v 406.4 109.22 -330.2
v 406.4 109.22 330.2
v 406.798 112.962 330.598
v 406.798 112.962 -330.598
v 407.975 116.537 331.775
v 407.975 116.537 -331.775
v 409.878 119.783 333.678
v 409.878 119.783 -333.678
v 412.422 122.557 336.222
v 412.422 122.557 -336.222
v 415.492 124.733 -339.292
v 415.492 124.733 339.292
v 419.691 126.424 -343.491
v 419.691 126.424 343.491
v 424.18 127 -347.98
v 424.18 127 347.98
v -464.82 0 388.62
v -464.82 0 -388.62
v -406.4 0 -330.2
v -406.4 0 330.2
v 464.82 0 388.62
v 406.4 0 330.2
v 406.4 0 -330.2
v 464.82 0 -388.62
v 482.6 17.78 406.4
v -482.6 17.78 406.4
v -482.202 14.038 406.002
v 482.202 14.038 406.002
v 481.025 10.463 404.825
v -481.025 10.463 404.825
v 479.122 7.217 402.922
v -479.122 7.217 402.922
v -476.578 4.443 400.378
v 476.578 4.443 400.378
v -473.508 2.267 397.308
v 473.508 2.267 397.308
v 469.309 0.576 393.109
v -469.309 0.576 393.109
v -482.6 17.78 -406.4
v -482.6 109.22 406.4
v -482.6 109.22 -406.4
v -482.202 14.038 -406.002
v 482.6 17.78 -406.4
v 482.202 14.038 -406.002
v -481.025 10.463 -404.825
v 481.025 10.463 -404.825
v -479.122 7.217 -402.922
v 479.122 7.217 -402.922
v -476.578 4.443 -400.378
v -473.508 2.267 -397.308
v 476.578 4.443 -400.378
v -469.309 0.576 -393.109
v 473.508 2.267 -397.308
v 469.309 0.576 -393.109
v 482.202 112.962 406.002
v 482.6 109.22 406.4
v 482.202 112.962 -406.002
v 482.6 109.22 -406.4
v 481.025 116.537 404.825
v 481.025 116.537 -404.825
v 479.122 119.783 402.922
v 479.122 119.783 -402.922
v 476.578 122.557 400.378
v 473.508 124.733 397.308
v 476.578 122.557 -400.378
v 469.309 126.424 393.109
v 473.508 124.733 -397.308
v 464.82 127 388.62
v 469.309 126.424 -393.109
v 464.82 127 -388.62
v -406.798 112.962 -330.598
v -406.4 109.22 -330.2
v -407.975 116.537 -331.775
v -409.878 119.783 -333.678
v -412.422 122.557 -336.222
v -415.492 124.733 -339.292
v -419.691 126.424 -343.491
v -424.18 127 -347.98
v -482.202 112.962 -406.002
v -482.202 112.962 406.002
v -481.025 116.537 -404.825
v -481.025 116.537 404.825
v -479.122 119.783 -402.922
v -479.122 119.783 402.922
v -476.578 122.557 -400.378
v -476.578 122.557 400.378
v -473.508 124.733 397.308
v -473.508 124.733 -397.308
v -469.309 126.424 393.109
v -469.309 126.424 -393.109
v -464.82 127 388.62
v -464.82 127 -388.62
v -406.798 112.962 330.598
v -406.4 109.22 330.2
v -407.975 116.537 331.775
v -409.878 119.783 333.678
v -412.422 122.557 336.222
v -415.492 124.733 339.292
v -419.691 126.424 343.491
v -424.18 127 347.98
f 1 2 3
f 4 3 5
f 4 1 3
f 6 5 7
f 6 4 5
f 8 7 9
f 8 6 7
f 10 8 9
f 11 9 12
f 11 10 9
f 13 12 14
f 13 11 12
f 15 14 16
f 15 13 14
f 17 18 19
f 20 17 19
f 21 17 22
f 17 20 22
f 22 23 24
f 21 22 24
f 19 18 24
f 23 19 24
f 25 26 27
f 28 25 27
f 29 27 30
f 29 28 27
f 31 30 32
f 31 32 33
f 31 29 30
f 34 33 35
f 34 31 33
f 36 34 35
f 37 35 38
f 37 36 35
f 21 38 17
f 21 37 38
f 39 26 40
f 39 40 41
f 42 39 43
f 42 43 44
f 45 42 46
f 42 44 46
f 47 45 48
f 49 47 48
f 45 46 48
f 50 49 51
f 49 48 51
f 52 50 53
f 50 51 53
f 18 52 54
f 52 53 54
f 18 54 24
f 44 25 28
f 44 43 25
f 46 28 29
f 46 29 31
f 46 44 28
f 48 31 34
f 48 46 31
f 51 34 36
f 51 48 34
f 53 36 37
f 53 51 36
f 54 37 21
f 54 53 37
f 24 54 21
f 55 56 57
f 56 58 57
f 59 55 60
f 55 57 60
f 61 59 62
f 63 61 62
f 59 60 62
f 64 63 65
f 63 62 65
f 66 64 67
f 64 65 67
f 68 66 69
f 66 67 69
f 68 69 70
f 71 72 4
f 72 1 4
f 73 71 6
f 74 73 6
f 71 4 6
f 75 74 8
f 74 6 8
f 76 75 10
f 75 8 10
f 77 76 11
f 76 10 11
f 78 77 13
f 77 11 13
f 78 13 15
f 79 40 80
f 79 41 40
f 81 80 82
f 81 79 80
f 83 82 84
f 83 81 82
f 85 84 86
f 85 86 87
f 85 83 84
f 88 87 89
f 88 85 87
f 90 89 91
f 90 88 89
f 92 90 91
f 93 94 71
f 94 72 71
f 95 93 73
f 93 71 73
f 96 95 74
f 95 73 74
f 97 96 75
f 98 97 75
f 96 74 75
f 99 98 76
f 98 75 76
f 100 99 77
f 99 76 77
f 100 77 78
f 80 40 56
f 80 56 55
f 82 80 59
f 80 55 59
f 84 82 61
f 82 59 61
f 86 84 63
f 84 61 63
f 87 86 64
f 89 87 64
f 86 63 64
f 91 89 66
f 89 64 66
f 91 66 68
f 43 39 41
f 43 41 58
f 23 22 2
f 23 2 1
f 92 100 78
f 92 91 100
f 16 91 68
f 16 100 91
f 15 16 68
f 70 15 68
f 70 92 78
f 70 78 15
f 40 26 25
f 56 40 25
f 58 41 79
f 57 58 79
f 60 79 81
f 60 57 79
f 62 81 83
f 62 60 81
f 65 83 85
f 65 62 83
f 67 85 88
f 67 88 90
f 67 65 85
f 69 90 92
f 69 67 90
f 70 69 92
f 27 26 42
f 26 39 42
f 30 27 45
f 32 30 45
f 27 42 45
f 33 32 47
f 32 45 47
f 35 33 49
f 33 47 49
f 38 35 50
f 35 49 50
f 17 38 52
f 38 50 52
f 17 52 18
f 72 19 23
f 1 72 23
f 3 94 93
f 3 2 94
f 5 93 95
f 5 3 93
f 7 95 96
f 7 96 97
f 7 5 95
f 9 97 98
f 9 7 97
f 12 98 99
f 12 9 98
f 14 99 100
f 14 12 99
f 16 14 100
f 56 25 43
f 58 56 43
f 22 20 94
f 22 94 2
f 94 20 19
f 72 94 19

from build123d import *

# Parameters (mm, degrees)
SKETCH1_W           = 965.2
SKETCH1_H           = 812.8
SKETCH1_W_2         = 812.8
SKETCH1_H_2         = 660.4
BOSS_EXTRUDE1_DEPTH = 127
FILLET1_R           = 17.78


with BuildPart() as part:
    # Sketch1 → Boss-Extrude1 (new body)
    with BuildSketch(Plane(origin=(0, 0, 0), x_dir=(1, 0, 0), z_dir=(0, 1, 0))):
        Rectangle(SKETCH1_W, SKETCH1_H)
        Rectangle(SKETCH1_W_2, SKETCH1_H_2, mode=Mode.SUBTRACT)
    extrude(amount=BOSS_EXTRUDE1_DEPTH)

    # Fillet1
    fillet1_edges = [part.edges().sort_by_distance(p)[0] for p in [
        (482.6, 127, 0),
        (406.4, 127, 0),
        (0, 127, -406.4),
        (0, 127, -330.2),
        (-406.4, 127, 0),
        (0, 127, 330.2),
        (-482.6, 127, 0),
        (0, 0, -406.4),
        (482.6, 0, 0),
        (0, 0, 406.4),
        (-482.6, 0, 0),
        (0, 127, 406.4),
    ]]
    fillet(fillet1_edges, radius=FILLET1_R)


solid = part.part
